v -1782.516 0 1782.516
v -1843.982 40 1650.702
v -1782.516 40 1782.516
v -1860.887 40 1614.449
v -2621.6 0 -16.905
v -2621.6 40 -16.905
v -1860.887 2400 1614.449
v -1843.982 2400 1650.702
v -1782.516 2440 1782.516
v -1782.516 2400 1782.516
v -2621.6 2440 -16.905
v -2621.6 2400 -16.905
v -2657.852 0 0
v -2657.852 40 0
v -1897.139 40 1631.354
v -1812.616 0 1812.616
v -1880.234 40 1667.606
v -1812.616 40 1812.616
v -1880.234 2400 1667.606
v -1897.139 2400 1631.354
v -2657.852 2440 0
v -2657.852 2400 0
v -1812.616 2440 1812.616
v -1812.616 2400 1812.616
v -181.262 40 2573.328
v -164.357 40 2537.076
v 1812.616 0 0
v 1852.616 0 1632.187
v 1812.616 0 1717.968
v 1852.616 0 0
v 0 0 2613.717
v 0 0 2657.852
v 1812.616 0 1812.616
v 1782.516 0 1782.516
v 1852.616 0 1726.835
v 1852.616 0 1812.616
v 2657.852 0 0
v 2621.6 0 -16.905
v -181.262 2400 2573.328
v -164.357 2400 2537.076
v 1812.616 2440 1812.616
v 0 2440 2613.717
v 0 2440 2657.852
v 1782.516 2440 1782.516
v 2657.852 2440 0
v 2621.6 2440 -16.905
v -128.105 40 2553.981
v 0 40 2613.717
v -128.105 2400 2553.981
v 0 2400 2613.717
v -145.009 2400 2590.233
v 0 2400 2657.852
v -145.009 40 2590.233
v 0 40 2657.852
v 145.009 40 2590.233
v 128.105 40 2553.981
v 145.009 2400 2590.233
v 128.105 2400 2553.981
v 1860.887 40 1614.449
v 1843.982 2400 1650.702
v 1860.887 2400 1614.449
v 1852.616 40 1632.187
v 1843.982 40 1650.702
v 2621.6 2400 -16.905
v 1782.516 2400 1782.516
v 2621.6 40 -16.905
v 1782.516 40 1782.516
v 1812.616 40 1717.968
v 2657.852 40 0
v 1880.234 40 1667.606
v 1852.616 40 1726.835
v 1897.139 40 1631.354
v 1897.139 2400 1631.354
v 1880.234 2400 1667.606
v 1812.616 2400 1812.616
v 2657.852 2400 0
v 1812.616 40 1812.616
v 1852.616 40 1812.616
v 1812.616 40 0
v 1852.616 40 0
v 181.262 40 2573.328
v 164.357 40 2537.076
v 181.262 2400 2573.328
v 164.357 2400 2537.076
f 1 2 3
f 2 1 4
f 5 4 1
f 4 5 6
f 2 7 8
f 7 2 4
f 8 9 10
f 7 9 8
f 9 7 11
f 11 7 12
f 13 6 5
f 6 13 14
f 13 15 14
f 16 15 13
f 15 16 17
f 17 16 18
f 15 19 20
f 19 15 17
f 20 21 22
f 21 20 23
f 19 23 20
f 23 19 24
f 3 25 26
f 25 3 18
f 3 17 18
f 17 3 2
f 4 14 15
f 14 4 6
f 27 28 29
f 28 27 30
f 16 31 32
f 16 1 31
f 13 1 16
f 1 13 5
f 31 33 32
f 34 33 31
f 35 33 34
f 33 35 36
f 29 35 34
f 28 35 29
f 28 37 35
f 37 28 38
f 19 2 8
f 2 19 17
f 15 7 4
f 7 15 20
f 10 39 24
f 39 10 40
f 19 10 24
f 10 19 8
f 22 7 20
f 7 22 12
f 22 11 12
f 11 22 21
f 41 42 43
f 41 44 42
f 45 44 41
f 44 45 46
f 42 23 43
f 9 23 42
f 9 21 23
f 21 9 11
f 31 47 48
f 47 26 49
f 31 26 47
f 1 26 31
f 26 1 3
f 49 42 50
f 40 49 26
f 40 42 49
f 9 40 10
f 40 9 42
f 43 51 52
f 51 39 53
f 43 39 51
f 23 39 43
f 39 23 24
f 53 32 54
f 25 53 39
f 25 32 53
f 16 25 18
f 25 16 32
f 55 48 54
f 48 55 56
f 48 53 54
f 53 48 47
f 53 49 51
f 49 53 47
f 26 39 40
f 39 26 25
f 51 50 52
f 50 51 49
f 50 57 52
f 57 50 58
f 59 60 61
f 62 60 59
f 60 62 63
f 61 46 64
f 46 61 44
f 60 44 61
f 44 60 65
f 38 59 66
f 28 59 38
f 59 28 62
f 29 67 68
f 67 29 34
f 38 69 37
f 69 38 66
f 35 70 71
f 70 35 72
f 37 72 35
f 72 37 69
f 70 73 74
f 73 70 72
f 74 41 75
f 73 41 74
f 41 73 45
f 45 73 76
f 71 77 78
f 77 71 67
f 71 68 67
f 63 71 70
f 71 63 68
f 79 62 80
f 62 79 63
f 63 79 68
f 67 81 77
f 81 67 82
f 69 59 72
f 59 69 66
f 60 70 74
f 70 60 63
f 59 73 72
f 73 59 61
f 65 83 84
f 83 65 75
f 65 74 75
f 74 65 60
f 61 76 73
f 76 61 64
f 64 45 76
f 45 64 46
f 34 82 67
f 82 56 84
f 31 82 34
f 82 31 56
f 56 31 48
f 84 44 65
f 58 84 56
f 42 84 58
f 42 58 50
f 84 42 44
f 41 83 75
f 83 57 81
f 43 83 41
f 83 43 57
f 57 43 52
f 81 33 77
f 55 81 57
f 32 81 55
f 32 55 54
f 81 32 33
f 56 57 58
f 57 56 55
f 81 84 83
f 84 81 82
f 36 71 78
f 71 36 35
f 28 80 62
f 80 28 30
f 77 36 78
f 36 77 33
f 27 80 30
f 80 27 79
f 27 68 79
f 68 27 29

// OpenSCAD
$fs=$fs/4;
$fa=$fa/4;

l = 2000;
a1 = 25;
a2 = 90-a1;

l2 = 3*800;
x = sin(a1)*l+sin(a2)*l;
y2 = cos(a1)*l;

module toto(){
    cube([40,40,l]);
    translate([0, 0,l-200]) cube([40,l2,40]);
    translate([0, l2,0]) cube([40,40,l]);
}

for(i=[0,1]){
    mirror([i,0,0])translate([-x, 0,0])union(){
        rotate([0,a1,0]) toto();

        translate([sin(a1)*l, 0,cos(a1)*l])rotate([0,a2,0])toto();
    }
}
translate([y2, 0, 0])cube([40,40,y2]);

echo(l2);
echo(2*x/1000);
echo(y2);



echo((3*3+4*4*2)/6*40); //40

echo(3*4*12);


echo((4*3+4*2*2)/6*40); //40
